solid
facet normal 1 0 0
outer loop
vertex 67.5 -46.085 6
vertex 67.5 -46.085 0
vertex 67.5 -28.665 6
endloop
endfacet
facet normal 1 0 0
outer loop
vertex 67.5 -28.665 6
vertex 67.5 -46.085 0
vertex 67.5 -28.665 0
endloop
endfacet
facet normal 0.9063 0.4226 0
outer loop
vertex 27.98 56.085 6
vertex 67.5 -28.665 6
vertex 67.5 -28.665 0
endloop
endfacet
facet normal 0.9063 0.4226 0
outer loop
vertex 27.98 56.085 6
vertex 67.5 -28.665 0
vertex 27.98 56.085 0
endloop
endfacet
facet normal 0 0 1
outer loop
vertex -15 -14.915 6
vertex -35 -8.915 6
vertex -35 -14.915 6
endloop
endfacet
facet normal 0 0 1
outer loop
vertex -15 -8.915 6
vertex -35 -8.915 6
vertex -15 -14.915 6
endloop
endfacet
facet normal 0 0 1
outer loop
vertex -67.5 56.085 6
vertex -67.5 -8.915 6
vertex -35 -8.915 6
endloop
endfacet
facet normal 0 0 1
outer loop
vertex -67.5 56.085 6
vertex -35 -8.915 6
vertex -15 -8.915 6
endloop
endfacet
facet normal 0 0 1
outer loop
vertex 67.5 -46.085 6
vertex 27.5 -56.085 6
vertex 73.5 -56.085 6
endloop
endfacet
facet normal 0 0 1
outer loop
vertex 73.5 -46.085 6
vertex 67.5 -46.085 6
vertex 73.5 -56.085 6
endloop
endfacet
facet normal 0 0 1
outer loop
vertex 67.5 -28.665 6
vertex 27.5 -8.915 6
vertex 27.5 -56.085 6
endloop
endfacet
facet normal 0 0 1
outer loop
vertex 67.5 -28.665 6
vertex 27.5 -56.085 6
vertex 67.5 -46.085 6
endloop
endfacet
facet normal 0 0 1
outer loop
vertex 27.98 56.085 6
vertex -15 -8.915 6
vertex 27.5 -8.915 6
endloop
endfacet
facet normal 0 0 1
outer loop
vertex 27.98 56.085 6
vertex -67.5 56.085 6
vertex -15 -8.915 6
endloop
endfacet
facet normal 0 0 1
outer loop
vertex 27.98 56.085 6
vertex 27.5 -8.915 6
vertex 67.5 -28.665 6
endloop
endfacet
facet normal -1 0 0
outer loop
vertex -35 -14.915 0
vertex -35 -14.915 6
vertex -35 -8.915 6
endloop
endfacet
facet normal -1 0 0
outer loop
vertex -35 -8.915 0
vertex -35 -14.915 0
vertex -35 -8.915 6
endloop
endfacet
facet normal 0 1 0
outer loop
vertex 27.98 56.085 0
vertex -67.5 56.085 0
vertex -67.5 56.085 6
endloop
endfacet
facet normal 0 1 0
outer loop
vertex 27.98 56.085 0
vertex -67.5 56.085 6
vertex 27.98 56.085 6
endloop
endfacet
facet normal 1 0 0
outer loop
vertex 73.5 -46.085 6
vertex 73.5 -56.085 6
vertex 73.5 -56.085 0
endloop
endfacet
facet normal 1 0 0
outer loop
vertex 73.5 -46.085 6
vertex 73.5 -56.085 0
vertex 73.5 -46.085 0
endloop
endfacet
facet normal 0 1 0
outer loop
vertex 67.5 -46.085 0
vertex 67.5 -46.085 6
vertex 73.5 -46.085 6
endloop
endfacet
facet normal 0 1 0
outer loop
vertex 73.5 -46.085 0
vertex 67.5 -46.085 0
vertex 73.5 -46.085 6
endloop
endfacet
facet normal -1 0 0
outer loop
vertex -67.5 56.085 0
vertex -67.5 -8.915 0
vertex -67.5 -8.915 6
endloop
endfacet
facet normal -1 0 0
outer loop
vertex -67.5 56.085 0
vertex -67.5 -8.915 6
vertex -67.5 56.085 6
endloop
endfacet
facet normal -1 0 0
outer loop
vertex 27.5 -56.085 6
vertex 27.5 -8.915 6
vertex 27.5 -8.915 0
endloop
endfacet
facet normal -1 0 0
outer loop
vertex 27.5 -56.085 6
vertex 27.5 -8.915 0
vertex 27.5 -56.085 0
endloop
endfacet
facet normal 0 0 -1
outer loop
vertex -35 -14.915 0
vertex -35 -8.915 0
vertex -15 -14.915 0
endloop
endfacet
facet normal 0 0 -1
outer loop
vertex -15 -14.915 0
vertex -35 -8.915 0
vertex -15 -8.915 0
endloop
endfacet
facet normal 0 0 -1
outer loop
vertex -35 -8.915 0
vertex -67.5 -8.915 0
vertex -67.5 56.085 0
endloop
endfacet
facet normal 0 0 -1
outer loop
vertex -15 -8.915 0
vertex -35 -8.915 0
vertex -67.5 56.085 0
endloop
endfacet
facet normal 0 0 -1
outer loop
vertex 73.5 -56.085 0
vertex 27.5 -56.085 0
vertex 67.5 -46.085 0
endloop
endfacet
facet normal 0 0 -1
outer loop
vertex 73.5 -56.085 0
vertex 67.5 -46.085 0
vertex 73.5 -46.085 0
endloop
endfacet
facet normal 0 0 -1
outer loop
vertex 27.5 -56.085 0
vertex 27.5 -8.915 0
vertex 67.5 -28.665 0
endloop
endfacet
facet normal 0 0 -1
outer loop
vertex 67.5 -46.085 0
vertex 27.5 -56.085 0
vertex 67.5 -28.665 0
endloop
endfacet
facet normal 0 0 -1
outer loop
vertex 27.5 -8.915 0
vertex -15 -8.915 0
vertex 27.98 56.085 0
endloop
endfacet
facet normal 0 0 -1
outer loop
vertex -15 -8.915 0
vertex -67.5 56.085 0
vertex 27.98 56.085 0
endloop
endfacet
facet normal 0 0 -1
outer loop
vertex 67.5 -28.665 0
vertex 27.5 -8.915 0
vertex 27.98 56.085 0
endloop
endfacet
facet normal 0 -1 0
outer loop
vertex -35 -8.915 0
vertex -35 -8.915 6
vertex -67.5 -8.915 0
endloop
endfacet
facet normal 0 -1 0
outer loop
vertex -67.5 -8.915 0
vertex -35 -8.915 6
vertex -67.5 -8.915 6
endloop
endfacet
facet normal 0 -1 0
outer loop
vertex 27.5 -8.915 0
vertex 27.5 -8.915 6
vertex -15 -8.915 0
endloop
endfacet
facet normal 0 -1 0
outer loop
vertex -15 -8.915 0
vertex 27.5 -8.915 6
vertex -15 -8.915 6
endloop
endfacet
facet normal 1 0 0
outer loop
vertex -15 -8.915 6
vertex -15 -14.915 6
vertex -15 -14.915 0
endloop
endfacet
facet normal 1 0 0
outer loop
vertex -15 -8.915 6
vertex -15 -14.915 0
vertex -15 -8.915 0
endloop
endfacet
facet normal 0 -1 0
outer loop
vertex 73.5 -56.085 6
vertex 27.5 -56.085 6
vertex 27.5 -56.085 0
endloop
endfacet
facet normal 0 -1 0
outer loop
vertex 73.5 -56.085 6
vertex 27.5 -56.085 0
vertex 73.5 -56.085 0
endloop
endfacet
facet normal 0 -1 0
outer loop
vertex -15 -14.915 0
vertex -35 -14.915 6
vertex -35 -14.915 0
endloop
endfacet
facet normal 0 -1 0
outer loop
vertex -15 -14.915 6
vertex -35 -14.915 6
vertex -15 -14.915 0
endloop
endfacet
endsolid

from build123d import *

# Parameters (mm, degrees)
ESQUISSE1_W             = 135
ESQUISSE1_H             = 112.17
BOSS_EXTRU_1_DEPTH      = 6
ENL_V_MAT_EXTRU_1_DEPTH = 6
ESQUISSE3_W             = 6
ESQUISSE3_H             = 10
ESQUISSE3_W_2           = 20
ESQUISSE3_H_2           = 6
BOSS_EXTRU_2_DEPTH      = 6


with BuildPart() as part:
    # Esquisse1 → Boss.-Extru.1 (new body)
    with BuildSketch(Plane.XY):
        Rectangle(ESQUISSE1_W, ESQUISSE1_H)
    extrude(amount=BOSS_EXTRU_1_DEPTH)

    # Esquisse2 → Enlèv. mat.-Extru.1 (cut)
    with BuildSketch(Plane.XY.offset(6)):
        Polygon((27.5, -56.085), (-67.5, -56.085), (-67.5, -8.915), (-38.5, -8.915), (27.5, -8.915), align=None)
        Polygon((67.5, -28.665), (27.980425971, 56.085), (67.5, 56.085), align=None)
    extrude(amount=-ENL_V_MAT_EXTRU_1_DEPTH, mode=Mode.SUBTRACT)

    # Esquisse3 → Boss.-Extru.2 (add)
    with BuildSketch(Plane.XY.offset(6)):
        with Locations((70.5, -51.085)):
            Rectangle(ESQUISSE3_W, ESQUISSE3_H)
        with Locations((-25, -11.915)):
            Rectangle(ESQUISSE3_W_2, ESQUISSE3_H_2)
    extrude(amount=-BOSS_EXTRU_2_DEPTH)


solid = part.part
